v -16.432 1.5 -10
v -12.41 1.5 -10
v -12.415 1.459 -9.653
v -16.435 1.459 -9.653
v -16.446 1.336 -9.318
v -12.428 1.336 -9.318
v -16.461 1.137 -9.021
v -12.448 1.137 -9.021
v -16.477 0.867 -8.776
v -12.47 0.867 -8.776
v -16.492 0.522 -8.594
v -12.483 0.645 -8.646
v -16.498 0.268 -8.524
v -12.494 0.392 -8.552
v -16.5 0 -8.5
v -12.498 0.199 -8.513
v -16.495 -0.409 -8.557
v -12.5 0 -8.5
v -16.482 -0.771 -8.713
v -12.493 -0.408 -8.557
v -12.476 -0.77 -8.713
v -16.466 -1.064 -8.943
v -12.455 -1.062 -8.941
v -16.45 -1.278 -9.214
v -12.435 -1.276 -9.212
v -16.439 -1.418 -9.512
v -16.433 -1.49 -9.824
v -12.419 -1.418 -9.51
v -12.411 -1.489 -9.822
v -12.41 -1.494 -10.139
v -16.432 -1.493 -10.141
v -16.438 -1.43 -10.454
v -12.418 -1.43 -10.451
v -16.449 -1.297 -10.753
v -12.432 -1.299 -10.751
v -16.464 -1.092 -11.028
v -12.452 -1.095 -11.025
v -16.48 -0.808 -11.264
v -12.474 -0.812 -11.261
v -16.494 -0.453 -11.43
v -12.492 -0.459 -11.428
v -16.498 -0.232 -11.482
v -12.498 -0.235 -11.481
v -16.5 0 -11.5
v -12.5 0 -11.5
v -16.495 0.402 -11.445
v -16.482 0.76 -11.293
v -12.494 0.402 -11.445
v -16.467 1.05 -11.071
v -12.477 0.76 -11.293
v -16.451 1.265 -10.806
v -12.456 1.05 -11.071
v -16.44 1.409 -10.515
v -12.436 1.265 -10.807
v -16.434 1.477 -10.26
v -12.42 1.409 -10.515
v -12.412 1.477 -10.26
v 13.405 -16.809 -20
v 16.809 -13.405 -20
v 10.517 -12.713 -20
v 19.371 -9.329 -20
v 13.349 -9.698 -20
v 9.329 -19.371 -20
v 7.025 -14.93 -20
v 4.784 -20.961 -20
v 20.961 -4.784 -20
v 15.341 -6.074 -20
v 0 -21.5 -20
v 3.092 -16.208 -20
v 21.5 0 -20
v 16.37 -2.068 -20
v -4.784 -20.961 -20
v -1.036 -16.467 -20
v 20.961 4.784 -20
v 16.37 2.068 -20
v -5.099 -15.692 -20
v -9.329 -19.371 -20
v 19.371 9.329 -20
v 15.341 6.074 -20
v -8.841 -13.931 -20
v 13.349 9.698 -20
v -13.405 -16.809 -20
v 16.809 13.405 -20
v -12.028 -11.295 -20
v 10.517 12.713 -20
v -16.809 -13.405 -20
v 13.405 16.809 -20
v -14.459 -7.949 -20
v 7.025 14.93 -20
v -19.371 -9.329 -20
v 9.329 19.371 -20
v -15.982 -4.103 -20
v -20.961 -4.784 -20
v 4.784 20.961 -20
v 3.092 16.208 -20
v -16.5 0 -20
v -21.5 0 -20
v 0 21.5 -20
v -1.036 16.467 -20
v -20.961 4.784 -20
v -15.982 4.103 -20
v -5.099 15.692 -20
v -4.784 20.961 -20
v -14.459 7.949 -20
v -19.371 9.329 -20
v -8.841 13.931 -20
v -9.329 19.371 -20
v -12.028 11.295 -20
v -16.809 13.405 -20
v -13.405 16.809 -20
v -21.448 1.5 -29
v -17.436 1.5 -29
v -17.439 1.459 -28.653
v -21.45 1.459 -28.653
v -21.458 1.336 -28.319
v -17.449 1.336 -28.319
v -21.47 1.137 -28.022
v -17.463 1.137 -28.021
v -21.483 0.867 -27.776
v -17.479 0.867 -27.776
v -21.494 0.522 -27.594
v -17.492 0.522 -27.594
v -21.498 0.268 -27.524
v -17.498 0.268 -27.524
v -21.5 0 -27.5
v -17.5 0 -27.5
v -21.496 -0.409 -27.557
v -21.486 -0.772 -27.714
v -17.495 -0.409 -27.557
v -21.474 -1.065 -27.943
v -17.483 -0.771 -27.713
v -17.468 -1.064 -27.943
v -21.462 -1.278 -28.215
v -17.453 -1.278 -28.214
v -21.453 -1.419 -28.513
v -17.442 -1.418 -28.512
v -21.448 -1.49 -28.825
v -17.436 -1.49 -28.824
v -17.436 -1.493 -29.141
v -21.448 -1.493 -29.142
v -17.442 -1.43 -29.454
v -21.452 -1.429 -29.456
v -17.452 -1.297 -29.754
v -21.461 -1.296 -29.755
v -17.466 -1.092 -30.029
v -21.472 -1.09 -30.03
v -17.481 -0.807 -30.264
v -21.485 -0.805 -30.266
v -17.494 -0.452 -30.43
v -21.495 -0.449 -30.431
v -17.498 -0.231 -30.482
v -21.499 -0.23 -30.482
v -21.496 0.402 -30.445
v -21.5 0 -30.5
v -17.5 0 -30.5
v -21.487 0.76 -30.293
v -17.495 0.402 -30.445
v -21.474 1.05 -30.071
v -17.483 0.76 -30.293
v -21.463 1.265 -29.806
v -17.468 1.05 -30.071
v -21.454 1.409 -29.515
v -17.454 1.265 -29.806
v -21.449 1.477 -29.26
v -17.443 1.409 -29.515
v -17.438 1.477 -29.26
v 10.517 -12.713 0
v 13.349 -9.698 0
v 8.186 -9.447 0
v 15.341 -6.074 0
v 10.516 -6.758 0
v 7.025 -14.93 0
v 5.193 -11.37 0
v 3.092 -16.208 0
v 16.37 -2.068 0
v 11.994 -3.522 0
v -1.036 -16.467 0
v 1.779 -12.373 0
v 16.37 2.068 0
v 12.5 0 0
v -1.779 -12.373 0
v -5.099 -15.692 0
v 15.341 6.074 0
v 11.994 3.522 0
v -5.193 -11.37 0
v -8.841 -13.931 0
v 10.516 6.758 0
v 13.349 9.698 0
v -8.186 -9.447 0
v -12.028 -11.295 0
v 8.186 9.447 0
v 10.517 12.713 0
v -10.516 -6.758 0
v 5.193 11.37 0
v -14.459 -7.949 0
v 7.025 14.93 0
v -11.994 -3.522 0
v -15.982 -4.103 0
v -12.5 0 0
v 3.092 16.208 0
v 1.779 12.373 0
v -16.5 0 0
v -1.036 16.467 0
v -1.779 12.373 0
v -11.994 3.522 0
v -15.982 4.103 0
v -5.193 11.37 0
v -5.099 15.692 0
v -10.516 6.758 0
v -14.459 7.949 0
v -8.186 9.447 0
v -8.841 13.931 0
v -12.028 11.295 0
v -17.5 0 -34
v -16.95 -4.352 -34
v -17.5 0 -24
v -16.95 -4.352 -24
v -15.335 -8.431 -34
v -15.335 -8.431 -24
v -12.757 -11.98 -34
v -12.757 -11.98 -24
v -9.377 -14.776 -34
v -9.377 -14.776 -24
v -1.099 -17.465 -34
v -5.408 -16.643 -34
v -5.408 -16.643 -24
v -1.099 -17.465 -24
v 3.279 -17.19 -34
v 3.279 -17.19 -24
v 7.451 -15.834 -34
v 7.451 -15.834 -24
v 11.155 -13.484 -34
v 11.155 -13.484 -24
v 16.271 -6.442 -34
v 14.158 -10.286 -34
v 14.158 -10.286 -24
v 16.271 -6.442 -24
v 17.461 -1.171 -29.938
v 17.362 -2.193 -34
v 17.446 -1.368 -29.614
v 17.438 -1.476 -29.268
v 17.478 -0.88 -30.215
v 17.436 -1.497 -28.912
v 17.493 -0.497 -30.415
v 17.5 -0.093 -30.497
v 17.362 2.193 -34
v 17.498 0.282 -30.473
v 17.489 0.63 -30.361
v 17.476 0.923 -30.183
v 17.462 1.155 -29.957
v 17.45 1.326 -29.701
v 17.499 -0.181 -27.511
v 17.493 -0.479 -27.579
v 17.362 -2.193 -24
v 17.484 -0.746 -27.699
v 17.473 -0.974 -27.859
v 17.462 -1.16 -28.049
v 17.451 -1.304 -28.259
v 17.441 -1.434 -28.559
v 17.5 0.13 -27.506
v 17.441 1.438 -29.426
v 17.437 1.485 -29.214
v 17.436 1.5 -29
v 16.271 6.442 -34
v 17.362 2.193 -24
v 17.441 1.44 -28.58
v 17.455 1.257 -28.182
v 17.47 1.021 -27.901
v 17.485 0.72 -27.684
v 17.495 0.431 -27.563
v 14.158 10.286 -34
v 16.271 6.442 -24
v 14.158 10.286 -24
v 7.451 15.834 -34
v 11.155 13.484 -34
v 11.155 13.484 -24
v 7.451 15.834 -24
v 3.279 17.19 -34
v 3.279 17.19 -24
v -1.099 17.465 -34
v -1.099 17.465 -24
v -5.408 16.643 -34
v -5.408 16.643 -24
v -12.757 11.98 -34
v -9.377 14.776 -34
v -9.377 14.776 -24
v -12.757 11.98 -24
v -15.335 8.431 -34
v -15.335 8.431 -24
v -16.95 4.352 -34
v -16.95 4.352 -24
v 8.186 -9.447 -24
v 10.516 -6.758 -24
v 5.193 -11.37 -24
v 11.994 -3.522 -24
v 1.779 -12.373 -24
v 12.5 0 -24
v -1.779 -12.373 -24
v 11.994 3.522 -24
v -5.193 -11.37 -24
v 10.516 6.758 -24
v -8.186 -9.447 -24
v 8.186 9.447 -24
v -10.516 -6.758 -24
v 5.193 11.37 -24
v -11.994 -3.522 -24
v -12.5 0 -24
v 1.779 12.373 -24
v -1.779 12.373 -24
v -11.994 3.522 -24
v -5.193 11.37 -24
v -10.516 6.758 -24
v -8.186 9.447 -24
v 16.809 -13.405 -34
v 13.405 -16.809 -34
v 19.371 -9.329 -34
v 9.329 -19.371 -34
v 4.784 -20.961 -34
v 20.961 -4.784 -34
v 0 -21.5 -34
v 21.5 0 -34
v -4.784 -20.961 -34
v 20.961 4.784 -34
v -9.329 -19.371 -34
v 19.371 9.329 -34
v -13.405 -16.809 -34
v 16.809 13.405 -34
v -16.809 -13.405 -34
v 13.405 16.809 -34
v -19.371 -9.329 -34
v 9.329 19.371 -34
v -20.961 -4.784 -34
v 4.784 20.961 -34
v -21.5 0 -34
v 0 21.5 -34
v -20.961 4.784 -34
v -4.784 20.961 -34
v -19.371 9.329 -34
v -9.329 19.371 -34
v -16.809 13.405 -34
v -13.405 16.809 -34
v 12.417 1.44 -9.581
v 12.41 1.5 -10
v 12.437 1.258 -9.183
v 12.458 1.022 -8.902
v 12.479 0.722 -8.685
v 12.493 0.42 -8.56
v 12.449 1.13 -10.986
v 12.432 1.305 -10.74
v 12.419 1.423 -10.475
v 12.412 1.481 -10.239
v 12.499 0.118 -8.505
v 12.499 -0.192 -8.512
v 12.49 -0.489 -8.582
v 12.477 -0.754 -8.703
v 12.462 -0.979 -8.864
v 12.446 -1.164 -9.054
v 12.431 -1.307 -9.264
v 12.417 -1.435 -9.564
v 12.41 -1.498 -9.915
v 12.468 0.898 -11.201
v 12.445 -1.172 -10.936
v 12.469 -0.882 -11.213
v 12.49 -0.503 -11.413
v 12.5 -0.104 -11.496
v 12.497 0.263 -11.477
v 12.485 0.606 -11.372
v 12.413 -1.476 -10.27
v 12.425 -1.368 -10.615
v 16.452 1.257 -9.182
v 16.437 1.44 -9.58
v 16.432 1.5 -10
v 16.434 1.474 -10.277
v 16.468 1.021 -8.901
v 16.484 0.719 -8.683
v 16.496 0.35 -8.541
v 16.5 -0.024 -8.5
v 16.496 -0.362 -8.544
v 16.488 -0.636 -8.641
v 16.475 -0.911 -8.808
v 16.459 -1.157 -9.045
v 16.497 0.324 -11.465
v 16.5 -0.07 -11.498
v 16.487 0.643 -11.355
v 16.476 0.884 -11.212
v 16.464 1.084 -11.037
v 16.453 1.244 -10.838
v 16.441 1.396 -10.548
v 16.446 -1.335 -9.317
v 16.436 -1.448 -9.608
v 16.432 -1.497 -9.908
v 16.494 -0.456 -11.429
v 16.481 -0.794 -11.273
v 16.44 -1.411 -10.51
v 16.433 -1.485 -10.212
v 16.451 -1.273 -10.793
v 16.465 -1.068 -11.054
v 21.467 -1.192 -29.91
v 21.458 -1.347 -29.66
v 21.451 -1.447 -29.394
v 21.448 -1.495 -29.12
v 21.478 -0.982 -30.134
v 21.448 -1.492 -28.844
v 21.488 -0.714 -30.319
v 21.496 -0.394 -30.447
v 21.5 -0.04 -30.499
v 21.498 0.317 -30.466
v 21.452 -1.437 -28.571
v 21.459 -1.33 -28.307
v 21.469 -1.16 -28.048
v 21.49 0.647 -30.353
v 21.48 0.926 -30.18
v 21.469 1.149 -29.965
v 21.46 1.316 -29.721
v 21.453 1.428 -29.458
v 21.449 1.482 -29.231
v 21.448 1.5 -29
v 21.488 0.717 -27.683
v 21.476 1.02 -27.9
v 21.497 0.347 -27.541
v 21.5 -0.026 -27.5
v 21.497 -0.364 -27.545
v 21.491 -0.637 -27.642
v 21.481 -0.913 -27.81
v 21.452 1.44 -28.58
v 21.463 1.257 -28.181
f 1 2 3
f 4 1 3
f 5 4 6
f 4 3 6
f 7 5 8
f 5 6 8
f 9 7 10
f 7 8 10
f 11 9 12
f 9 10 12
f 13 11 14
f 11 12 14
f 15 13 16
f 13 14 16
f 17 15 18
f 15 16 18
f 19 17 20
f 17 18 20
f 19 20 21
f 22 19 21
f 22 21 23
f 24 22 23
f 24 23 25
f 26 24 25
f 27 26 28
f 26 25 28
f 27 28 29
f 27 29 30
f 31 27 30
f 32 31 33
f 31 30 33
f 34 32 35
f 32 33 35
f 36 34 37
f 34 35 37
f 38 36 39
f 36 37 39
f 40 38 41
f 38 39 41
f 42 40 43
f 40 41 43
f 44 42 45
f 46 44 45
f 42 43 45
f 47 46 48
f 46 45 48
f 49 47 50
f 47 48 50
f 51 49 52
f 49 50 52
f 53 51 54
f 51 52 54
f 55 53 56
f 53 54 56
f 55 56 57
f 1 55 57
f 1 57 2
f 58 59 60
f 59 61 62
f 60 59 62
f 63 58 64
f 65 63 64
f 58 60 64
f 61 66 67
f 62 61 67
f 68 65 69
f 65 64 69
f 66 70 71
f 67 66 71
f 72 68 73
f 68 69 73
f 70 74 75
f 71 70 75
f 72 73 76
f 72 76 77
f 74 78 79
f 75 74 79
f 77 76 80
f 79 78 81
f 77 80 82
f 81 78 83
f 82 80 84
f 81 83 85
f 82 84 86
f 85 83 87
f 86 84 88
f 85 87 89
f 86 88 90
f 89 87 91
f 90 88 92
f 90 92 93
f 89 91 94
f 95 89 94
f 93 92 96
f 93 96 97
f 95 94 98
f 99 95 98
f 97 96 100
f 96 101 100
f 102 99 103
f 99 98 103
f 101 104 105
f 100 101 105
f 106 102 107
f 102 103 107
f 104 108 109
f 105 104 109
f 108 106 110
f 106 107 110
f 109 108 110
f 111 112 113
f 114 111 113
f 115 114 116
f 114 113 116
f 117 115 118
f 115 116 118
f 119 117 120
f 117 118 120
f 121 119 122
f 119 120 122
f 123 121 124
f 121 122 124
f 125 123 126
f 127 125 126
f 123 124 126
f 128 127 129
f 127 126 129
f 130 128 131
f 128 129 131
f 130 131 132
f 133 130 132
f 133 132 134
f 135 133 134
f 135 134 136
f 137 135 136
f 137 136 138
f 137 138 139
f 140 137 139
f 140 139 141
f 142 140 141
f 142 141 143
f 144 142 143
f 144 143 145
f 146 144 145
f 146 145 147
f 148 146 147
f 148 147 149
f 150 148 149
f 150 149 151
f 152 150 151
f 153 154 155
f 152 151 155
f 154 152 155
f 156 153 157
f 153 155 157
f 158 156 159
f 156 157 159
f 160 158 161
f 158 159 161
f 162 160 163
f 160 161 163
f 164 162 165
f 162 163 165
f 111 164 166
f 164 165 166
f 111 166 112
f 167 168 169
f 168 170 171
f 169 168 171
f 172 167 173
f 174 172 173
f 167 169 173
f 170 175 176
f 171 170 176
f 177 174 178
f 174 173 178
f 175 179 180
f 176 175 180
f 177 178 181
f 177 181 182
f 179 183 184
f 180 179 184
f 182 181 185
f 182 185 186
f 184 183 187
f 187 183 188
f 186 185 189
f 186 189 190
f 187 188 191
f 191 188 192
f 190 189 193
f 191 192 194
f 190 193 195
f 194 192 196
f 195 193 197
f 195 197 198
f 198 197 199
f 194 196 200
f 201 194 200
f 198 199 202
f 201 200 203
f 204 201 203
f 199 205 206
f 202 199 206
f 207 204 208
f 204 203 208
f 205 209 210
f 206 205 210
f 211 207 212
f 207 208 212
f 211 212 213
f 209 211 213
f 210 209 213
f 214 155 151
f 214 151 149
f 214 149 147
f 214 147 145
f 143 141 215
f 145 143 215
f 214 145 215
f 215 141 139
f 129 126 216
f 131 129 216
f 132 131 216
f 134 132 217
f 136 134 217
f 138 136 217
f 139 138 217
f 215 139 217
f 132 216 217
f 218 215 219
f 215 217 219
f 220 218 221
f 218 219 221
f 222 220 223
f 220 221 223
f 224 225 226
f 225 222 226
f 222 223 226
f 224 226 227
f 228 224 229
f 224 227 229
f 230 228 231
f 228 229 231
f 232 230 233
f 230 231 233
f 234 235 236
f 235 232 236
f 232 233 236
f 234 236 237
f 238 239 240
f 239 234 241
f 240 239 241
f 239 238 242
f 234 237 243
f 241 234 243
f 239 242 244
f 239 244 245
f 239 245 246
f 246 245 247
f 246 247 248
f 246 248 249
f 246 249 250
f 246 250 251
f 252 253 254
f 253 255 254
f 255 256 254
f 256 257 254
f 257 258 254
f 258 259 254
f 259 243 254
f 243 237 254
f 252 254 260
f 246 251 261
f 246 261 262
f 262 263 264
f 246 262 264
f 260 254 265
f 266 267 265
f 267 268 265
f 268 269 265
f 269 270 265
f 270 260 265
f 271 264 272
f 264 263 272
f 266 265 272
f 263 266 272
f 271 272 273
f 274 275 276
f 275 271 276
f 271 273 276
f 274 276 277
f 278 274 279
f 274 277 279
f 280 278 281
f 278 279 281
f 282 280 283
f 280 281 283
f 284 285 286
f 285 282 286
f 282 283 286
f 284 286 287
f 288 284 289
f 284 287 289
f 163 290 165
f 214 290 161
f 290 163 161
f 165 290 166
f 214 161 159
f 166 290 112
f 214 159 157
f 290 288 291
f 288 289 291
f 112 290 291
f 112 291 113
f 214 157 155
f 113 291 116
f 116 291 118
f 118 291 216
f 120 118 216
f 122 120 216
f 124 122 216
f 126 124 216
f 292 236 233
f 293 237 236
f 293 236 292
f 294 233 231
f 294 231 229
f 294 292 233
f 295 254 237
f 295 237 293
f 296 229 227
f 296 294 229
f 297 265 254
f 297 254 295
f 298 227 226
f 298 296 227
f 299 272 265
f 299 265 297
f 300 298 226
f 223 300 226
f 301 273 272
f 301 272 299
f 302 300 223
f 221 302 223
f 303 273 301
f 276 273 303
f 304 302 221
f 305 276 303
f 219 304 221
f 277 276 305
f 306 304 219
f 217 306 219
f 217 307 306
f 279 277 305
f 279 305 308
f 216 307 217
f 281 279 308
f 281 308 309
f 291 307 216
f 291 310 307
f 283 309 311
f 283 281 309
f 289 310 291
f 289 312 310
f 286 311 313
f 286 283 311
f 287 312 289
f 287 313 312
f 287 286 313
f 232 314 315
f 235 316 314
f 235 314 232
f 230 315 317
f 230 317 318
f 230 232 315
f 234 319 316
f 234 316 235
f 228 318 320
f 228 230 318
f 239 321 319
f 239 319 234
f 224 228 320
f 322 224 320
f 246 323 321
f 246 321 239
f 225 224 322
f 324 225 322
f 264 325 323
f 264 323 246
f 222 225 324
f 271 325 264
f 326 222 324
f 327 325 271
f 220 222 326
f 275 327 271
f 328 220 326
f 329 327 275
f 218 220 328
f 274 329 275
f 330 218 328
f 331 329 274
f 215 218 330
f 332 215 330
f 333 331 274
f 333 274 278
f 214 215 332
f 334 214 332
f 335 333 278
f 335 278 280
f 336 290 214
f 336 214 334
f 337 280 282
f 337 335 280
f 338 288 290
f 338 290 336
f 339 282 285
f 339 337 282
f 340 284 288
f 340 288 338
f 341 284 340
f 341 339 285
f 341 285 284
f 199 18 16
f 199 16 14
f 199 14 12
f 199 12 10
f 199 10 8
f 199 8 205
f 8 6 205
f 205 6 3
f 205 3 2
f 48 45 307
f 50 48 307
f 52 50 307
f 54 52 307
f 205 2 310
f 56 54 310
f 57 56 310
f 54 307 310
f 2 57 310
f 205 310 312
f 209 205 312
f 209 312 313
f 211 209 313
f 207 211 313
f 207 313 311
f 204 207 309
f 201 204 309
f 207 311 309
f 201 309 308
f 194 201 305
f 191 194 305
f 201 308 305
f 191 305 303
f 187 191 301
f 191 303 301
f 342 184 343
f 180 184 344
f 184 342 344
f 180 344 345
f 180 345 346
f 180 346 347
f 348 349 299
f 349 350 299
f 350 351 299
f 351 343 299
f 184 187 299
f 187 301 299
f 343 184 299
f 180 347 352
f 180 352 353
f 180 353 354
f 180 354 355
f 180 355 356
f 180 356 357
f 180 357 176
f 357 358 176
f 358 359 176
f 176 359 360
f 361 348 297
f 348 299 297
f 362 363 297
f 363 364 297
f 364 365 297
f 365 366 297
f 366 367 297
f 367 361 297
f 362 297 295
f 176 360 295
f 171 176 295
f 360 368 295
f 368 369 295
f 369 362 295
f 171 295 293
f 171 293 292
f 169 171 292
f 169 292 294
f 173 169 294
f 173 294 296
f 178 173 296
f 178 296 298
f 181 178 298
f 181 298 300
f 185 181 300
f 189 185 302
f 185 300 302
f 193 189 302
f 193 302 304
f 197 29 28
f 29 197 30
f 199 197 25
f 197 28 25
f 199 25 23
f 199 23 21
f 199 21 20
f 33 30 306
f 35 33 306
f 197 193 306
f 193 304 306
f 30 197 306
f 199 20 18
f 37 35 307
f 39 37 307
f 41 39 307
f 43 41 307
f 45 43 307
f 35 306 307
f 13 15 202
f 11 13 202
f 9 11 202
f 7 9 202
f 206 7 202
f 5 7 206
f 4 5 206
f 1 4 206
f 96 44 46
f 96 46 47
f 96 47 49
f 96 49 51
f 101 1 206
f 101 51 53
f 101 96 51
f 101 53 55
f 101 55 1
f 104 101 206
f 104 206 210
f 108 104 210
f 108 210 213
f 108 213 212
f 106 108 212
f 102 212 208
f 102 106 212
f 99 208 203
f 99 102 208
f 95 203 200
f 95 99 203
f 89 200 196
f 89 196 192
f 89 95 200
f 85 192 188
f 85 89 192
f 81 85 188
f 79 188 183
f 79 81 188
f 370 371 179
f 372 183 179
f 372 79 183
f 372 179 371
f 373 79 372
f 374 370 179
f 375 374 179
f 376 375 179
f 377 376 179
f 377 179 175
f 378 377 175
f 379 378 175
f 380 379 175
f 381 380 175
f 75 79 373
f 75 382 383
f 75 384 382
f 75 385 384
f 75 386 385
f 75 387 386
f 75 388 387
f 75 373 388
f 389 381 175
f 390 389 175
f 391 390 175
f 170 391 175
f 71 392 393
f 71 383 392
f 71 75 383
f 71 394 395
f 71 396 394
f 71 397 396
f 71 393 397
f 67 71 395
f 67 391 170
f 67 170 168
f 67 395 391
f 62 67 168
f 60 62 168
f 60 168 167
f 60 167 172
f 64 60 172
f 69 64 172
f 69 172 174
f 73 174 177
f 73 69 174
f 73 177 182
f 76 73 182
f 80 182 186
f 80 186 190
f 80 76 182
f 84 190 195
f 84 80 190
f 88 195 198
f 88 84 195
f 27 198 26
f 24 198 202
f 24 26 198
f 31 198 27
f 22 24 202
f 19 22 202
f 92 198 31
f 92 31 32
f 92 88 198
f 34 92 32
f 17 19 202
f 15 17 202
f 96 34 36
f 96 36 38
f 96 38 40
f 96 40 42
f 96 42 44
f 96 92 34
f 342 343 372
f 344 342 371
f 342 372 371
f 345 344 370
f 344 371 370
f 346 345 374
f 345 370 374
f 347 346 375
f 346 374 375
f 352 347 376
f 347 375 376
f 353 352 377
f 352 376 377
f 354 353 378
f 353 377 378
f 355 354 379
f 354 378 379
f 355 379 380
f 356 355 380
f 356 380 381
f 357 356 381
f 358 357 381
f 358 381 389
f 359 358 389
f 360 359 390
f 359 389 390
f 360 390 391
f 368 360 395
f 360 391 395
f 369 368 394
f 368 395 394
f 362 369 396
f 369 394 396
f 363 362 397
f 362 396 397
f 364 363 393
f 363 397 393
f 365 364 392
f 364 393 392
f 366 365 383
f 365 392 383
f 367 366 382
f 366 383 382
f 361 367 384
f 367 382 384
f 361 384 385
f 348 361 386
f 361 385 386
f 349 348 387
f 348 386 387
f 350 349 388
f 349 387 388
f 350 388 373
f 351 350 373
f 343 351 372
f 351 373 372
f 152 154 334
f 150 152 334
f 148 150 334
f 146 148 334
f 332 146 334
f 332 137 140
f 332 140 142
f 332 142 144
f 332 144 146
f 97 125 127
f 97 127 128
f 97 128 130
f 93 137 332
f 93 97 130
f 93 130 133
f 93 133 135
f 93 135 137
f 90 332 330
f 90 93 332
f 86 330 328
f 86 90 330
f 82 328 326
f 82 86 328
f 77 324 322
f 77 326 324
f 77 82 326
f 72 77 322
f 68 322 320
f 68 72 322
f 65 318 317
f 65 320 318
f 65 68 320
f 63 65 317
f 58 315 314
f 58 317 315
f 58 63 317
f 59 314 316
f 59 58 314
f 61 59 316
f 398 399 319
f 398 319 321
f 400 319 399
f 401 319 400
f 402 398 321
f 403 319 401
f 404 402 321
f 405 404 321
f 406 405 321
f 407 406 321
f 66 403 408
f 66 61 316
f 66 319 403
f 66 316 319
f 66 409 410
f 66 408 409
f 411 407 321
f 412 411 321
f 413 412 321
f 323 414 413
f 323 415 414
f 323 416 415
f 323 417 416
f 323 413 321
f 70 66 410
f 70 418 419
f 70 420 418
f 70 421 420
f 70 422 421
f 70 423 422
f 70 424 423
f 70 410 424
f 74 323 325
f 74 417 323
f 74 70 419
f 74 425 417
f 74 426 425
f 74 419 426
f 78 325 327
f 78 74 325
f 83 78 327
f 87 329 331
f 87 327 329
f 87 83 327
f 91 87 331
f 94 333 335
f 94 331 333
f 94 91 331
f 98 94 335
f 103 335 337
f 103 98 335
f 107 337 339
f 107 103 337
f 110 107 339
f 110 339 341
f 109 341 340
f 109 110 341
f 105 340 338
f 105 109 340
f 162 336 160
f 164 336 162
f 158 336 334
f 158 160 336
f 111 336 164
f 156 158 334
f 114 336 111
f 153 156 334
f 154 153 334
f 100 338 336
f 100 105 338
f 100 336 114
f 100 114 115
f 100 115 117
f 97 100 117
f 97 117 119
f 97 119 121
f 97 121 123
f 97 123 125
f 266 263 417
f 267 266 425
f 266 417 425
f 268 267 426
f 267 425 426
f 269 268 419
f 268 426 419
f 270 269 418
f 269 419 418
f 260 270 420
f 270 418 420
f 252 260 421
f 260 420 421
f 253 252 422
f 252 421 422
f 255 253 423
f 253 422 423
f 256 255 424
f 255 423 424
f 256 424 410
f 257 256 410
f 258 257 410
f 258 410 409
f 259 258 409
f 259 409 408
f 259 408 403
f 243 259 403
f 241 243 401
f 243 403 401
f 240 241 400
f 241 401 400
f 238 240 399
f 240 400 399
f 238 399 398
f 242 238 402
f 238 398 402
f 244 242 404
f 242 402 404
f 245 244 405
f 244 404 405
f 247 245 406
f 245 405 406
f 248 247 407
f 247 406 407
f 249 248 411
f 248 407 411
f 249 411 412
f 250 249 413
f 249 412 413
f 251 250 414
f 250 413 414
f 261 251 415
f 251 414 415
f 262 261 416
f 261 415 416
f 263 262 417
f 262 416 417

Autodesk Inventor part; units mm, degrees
ref_plane "YZ Plane" through (0, 0, 0) normal (1, 0, 0) x (0, 1, 0)
ref_plane "XZ Plane" through (0, 0, 0) normal (0, 1, 0) x (-1, 0, 0)
ref_plane "XY Plane" through (0, 0, 0) normal (0, 0, 1) x (1, 0, 0)
sketch "Эскиз1" plane through (0, 0, 0) normal (0, 1, 0) x (-1, 0, 0)
  line L0 (0, 0) -> (12.5, 0)
  line L1 (12.5, 0) -> (16.5, 0)
  line L2 (16.5, 0) -> (16.5, -24)
  line L3 (12.5, 0) -> (12.5, -24)
  line L4 (12.5, -24) -> (16.5, -24)
  line L5 (12.5, -24) -> (0, -24)
  line L6 (0, -24) -> (0, -34)
  line L7 (0, -34) -> (17.5, -34)
  line L8 (17.5, -34) -> (17.5, -24)
  line L9 (17.5, -24) -> (16.5, -24)
  line L10 (17.5, -34) -> (21.5, -34)
  line L11 (21.5, -34) -> (21.5, -20)
  line L12 (21.5, -20) -> (16.5, -20)
  dimension "d0" = 12.5
  dimension "d1" = 4
  dimension "d2" = 24
  dimension "d3" = 10
  dimension "d4" = 17.5
  dimension "d5" = 4
  dimension "d6" = 14
revolve "Вращение1" add sketch "Эскиз1" angle 360 about axis through (0, 0, -24) along (0, 0, -1) contours L1 L2 L4 L3 | L12 L11 L10 L8 L9 L2
sketch "Эскиз2" plane through (0, 0, 0) normal (1, 0, 0) x (0, 1, 0)
  line L0 (0, 0) -> (0, -10)
  line L1 (-17.5, -34) -> (17.5, -34) projected
  line L2 (0, -34) -> (0, -24)
  line L3 (0, -24) -> (0, -29)
  circle A0 centre (0, -10) radius 1.5
  circle A1 centre (0, -29) radius 1.5
  dimension "d8" = 10
  dimension "d9" = 10
  dimension "d10" = 5
  dimension "d11" = 3
  dimension "d12" = 3
extrude "Выдавливание1" cut sketch "Эскиз2" along normal blind 29.75 and the other way blind 30.75
thread "Резьба1" size "M3x0.5" class "6H" standard "ANSI Metric M Profile" full length
thread "Резьба2" size "M3x0.5" class "6H" standard "ANSI Metric M Profile" full length
properties part number "17701729.303511.017"
